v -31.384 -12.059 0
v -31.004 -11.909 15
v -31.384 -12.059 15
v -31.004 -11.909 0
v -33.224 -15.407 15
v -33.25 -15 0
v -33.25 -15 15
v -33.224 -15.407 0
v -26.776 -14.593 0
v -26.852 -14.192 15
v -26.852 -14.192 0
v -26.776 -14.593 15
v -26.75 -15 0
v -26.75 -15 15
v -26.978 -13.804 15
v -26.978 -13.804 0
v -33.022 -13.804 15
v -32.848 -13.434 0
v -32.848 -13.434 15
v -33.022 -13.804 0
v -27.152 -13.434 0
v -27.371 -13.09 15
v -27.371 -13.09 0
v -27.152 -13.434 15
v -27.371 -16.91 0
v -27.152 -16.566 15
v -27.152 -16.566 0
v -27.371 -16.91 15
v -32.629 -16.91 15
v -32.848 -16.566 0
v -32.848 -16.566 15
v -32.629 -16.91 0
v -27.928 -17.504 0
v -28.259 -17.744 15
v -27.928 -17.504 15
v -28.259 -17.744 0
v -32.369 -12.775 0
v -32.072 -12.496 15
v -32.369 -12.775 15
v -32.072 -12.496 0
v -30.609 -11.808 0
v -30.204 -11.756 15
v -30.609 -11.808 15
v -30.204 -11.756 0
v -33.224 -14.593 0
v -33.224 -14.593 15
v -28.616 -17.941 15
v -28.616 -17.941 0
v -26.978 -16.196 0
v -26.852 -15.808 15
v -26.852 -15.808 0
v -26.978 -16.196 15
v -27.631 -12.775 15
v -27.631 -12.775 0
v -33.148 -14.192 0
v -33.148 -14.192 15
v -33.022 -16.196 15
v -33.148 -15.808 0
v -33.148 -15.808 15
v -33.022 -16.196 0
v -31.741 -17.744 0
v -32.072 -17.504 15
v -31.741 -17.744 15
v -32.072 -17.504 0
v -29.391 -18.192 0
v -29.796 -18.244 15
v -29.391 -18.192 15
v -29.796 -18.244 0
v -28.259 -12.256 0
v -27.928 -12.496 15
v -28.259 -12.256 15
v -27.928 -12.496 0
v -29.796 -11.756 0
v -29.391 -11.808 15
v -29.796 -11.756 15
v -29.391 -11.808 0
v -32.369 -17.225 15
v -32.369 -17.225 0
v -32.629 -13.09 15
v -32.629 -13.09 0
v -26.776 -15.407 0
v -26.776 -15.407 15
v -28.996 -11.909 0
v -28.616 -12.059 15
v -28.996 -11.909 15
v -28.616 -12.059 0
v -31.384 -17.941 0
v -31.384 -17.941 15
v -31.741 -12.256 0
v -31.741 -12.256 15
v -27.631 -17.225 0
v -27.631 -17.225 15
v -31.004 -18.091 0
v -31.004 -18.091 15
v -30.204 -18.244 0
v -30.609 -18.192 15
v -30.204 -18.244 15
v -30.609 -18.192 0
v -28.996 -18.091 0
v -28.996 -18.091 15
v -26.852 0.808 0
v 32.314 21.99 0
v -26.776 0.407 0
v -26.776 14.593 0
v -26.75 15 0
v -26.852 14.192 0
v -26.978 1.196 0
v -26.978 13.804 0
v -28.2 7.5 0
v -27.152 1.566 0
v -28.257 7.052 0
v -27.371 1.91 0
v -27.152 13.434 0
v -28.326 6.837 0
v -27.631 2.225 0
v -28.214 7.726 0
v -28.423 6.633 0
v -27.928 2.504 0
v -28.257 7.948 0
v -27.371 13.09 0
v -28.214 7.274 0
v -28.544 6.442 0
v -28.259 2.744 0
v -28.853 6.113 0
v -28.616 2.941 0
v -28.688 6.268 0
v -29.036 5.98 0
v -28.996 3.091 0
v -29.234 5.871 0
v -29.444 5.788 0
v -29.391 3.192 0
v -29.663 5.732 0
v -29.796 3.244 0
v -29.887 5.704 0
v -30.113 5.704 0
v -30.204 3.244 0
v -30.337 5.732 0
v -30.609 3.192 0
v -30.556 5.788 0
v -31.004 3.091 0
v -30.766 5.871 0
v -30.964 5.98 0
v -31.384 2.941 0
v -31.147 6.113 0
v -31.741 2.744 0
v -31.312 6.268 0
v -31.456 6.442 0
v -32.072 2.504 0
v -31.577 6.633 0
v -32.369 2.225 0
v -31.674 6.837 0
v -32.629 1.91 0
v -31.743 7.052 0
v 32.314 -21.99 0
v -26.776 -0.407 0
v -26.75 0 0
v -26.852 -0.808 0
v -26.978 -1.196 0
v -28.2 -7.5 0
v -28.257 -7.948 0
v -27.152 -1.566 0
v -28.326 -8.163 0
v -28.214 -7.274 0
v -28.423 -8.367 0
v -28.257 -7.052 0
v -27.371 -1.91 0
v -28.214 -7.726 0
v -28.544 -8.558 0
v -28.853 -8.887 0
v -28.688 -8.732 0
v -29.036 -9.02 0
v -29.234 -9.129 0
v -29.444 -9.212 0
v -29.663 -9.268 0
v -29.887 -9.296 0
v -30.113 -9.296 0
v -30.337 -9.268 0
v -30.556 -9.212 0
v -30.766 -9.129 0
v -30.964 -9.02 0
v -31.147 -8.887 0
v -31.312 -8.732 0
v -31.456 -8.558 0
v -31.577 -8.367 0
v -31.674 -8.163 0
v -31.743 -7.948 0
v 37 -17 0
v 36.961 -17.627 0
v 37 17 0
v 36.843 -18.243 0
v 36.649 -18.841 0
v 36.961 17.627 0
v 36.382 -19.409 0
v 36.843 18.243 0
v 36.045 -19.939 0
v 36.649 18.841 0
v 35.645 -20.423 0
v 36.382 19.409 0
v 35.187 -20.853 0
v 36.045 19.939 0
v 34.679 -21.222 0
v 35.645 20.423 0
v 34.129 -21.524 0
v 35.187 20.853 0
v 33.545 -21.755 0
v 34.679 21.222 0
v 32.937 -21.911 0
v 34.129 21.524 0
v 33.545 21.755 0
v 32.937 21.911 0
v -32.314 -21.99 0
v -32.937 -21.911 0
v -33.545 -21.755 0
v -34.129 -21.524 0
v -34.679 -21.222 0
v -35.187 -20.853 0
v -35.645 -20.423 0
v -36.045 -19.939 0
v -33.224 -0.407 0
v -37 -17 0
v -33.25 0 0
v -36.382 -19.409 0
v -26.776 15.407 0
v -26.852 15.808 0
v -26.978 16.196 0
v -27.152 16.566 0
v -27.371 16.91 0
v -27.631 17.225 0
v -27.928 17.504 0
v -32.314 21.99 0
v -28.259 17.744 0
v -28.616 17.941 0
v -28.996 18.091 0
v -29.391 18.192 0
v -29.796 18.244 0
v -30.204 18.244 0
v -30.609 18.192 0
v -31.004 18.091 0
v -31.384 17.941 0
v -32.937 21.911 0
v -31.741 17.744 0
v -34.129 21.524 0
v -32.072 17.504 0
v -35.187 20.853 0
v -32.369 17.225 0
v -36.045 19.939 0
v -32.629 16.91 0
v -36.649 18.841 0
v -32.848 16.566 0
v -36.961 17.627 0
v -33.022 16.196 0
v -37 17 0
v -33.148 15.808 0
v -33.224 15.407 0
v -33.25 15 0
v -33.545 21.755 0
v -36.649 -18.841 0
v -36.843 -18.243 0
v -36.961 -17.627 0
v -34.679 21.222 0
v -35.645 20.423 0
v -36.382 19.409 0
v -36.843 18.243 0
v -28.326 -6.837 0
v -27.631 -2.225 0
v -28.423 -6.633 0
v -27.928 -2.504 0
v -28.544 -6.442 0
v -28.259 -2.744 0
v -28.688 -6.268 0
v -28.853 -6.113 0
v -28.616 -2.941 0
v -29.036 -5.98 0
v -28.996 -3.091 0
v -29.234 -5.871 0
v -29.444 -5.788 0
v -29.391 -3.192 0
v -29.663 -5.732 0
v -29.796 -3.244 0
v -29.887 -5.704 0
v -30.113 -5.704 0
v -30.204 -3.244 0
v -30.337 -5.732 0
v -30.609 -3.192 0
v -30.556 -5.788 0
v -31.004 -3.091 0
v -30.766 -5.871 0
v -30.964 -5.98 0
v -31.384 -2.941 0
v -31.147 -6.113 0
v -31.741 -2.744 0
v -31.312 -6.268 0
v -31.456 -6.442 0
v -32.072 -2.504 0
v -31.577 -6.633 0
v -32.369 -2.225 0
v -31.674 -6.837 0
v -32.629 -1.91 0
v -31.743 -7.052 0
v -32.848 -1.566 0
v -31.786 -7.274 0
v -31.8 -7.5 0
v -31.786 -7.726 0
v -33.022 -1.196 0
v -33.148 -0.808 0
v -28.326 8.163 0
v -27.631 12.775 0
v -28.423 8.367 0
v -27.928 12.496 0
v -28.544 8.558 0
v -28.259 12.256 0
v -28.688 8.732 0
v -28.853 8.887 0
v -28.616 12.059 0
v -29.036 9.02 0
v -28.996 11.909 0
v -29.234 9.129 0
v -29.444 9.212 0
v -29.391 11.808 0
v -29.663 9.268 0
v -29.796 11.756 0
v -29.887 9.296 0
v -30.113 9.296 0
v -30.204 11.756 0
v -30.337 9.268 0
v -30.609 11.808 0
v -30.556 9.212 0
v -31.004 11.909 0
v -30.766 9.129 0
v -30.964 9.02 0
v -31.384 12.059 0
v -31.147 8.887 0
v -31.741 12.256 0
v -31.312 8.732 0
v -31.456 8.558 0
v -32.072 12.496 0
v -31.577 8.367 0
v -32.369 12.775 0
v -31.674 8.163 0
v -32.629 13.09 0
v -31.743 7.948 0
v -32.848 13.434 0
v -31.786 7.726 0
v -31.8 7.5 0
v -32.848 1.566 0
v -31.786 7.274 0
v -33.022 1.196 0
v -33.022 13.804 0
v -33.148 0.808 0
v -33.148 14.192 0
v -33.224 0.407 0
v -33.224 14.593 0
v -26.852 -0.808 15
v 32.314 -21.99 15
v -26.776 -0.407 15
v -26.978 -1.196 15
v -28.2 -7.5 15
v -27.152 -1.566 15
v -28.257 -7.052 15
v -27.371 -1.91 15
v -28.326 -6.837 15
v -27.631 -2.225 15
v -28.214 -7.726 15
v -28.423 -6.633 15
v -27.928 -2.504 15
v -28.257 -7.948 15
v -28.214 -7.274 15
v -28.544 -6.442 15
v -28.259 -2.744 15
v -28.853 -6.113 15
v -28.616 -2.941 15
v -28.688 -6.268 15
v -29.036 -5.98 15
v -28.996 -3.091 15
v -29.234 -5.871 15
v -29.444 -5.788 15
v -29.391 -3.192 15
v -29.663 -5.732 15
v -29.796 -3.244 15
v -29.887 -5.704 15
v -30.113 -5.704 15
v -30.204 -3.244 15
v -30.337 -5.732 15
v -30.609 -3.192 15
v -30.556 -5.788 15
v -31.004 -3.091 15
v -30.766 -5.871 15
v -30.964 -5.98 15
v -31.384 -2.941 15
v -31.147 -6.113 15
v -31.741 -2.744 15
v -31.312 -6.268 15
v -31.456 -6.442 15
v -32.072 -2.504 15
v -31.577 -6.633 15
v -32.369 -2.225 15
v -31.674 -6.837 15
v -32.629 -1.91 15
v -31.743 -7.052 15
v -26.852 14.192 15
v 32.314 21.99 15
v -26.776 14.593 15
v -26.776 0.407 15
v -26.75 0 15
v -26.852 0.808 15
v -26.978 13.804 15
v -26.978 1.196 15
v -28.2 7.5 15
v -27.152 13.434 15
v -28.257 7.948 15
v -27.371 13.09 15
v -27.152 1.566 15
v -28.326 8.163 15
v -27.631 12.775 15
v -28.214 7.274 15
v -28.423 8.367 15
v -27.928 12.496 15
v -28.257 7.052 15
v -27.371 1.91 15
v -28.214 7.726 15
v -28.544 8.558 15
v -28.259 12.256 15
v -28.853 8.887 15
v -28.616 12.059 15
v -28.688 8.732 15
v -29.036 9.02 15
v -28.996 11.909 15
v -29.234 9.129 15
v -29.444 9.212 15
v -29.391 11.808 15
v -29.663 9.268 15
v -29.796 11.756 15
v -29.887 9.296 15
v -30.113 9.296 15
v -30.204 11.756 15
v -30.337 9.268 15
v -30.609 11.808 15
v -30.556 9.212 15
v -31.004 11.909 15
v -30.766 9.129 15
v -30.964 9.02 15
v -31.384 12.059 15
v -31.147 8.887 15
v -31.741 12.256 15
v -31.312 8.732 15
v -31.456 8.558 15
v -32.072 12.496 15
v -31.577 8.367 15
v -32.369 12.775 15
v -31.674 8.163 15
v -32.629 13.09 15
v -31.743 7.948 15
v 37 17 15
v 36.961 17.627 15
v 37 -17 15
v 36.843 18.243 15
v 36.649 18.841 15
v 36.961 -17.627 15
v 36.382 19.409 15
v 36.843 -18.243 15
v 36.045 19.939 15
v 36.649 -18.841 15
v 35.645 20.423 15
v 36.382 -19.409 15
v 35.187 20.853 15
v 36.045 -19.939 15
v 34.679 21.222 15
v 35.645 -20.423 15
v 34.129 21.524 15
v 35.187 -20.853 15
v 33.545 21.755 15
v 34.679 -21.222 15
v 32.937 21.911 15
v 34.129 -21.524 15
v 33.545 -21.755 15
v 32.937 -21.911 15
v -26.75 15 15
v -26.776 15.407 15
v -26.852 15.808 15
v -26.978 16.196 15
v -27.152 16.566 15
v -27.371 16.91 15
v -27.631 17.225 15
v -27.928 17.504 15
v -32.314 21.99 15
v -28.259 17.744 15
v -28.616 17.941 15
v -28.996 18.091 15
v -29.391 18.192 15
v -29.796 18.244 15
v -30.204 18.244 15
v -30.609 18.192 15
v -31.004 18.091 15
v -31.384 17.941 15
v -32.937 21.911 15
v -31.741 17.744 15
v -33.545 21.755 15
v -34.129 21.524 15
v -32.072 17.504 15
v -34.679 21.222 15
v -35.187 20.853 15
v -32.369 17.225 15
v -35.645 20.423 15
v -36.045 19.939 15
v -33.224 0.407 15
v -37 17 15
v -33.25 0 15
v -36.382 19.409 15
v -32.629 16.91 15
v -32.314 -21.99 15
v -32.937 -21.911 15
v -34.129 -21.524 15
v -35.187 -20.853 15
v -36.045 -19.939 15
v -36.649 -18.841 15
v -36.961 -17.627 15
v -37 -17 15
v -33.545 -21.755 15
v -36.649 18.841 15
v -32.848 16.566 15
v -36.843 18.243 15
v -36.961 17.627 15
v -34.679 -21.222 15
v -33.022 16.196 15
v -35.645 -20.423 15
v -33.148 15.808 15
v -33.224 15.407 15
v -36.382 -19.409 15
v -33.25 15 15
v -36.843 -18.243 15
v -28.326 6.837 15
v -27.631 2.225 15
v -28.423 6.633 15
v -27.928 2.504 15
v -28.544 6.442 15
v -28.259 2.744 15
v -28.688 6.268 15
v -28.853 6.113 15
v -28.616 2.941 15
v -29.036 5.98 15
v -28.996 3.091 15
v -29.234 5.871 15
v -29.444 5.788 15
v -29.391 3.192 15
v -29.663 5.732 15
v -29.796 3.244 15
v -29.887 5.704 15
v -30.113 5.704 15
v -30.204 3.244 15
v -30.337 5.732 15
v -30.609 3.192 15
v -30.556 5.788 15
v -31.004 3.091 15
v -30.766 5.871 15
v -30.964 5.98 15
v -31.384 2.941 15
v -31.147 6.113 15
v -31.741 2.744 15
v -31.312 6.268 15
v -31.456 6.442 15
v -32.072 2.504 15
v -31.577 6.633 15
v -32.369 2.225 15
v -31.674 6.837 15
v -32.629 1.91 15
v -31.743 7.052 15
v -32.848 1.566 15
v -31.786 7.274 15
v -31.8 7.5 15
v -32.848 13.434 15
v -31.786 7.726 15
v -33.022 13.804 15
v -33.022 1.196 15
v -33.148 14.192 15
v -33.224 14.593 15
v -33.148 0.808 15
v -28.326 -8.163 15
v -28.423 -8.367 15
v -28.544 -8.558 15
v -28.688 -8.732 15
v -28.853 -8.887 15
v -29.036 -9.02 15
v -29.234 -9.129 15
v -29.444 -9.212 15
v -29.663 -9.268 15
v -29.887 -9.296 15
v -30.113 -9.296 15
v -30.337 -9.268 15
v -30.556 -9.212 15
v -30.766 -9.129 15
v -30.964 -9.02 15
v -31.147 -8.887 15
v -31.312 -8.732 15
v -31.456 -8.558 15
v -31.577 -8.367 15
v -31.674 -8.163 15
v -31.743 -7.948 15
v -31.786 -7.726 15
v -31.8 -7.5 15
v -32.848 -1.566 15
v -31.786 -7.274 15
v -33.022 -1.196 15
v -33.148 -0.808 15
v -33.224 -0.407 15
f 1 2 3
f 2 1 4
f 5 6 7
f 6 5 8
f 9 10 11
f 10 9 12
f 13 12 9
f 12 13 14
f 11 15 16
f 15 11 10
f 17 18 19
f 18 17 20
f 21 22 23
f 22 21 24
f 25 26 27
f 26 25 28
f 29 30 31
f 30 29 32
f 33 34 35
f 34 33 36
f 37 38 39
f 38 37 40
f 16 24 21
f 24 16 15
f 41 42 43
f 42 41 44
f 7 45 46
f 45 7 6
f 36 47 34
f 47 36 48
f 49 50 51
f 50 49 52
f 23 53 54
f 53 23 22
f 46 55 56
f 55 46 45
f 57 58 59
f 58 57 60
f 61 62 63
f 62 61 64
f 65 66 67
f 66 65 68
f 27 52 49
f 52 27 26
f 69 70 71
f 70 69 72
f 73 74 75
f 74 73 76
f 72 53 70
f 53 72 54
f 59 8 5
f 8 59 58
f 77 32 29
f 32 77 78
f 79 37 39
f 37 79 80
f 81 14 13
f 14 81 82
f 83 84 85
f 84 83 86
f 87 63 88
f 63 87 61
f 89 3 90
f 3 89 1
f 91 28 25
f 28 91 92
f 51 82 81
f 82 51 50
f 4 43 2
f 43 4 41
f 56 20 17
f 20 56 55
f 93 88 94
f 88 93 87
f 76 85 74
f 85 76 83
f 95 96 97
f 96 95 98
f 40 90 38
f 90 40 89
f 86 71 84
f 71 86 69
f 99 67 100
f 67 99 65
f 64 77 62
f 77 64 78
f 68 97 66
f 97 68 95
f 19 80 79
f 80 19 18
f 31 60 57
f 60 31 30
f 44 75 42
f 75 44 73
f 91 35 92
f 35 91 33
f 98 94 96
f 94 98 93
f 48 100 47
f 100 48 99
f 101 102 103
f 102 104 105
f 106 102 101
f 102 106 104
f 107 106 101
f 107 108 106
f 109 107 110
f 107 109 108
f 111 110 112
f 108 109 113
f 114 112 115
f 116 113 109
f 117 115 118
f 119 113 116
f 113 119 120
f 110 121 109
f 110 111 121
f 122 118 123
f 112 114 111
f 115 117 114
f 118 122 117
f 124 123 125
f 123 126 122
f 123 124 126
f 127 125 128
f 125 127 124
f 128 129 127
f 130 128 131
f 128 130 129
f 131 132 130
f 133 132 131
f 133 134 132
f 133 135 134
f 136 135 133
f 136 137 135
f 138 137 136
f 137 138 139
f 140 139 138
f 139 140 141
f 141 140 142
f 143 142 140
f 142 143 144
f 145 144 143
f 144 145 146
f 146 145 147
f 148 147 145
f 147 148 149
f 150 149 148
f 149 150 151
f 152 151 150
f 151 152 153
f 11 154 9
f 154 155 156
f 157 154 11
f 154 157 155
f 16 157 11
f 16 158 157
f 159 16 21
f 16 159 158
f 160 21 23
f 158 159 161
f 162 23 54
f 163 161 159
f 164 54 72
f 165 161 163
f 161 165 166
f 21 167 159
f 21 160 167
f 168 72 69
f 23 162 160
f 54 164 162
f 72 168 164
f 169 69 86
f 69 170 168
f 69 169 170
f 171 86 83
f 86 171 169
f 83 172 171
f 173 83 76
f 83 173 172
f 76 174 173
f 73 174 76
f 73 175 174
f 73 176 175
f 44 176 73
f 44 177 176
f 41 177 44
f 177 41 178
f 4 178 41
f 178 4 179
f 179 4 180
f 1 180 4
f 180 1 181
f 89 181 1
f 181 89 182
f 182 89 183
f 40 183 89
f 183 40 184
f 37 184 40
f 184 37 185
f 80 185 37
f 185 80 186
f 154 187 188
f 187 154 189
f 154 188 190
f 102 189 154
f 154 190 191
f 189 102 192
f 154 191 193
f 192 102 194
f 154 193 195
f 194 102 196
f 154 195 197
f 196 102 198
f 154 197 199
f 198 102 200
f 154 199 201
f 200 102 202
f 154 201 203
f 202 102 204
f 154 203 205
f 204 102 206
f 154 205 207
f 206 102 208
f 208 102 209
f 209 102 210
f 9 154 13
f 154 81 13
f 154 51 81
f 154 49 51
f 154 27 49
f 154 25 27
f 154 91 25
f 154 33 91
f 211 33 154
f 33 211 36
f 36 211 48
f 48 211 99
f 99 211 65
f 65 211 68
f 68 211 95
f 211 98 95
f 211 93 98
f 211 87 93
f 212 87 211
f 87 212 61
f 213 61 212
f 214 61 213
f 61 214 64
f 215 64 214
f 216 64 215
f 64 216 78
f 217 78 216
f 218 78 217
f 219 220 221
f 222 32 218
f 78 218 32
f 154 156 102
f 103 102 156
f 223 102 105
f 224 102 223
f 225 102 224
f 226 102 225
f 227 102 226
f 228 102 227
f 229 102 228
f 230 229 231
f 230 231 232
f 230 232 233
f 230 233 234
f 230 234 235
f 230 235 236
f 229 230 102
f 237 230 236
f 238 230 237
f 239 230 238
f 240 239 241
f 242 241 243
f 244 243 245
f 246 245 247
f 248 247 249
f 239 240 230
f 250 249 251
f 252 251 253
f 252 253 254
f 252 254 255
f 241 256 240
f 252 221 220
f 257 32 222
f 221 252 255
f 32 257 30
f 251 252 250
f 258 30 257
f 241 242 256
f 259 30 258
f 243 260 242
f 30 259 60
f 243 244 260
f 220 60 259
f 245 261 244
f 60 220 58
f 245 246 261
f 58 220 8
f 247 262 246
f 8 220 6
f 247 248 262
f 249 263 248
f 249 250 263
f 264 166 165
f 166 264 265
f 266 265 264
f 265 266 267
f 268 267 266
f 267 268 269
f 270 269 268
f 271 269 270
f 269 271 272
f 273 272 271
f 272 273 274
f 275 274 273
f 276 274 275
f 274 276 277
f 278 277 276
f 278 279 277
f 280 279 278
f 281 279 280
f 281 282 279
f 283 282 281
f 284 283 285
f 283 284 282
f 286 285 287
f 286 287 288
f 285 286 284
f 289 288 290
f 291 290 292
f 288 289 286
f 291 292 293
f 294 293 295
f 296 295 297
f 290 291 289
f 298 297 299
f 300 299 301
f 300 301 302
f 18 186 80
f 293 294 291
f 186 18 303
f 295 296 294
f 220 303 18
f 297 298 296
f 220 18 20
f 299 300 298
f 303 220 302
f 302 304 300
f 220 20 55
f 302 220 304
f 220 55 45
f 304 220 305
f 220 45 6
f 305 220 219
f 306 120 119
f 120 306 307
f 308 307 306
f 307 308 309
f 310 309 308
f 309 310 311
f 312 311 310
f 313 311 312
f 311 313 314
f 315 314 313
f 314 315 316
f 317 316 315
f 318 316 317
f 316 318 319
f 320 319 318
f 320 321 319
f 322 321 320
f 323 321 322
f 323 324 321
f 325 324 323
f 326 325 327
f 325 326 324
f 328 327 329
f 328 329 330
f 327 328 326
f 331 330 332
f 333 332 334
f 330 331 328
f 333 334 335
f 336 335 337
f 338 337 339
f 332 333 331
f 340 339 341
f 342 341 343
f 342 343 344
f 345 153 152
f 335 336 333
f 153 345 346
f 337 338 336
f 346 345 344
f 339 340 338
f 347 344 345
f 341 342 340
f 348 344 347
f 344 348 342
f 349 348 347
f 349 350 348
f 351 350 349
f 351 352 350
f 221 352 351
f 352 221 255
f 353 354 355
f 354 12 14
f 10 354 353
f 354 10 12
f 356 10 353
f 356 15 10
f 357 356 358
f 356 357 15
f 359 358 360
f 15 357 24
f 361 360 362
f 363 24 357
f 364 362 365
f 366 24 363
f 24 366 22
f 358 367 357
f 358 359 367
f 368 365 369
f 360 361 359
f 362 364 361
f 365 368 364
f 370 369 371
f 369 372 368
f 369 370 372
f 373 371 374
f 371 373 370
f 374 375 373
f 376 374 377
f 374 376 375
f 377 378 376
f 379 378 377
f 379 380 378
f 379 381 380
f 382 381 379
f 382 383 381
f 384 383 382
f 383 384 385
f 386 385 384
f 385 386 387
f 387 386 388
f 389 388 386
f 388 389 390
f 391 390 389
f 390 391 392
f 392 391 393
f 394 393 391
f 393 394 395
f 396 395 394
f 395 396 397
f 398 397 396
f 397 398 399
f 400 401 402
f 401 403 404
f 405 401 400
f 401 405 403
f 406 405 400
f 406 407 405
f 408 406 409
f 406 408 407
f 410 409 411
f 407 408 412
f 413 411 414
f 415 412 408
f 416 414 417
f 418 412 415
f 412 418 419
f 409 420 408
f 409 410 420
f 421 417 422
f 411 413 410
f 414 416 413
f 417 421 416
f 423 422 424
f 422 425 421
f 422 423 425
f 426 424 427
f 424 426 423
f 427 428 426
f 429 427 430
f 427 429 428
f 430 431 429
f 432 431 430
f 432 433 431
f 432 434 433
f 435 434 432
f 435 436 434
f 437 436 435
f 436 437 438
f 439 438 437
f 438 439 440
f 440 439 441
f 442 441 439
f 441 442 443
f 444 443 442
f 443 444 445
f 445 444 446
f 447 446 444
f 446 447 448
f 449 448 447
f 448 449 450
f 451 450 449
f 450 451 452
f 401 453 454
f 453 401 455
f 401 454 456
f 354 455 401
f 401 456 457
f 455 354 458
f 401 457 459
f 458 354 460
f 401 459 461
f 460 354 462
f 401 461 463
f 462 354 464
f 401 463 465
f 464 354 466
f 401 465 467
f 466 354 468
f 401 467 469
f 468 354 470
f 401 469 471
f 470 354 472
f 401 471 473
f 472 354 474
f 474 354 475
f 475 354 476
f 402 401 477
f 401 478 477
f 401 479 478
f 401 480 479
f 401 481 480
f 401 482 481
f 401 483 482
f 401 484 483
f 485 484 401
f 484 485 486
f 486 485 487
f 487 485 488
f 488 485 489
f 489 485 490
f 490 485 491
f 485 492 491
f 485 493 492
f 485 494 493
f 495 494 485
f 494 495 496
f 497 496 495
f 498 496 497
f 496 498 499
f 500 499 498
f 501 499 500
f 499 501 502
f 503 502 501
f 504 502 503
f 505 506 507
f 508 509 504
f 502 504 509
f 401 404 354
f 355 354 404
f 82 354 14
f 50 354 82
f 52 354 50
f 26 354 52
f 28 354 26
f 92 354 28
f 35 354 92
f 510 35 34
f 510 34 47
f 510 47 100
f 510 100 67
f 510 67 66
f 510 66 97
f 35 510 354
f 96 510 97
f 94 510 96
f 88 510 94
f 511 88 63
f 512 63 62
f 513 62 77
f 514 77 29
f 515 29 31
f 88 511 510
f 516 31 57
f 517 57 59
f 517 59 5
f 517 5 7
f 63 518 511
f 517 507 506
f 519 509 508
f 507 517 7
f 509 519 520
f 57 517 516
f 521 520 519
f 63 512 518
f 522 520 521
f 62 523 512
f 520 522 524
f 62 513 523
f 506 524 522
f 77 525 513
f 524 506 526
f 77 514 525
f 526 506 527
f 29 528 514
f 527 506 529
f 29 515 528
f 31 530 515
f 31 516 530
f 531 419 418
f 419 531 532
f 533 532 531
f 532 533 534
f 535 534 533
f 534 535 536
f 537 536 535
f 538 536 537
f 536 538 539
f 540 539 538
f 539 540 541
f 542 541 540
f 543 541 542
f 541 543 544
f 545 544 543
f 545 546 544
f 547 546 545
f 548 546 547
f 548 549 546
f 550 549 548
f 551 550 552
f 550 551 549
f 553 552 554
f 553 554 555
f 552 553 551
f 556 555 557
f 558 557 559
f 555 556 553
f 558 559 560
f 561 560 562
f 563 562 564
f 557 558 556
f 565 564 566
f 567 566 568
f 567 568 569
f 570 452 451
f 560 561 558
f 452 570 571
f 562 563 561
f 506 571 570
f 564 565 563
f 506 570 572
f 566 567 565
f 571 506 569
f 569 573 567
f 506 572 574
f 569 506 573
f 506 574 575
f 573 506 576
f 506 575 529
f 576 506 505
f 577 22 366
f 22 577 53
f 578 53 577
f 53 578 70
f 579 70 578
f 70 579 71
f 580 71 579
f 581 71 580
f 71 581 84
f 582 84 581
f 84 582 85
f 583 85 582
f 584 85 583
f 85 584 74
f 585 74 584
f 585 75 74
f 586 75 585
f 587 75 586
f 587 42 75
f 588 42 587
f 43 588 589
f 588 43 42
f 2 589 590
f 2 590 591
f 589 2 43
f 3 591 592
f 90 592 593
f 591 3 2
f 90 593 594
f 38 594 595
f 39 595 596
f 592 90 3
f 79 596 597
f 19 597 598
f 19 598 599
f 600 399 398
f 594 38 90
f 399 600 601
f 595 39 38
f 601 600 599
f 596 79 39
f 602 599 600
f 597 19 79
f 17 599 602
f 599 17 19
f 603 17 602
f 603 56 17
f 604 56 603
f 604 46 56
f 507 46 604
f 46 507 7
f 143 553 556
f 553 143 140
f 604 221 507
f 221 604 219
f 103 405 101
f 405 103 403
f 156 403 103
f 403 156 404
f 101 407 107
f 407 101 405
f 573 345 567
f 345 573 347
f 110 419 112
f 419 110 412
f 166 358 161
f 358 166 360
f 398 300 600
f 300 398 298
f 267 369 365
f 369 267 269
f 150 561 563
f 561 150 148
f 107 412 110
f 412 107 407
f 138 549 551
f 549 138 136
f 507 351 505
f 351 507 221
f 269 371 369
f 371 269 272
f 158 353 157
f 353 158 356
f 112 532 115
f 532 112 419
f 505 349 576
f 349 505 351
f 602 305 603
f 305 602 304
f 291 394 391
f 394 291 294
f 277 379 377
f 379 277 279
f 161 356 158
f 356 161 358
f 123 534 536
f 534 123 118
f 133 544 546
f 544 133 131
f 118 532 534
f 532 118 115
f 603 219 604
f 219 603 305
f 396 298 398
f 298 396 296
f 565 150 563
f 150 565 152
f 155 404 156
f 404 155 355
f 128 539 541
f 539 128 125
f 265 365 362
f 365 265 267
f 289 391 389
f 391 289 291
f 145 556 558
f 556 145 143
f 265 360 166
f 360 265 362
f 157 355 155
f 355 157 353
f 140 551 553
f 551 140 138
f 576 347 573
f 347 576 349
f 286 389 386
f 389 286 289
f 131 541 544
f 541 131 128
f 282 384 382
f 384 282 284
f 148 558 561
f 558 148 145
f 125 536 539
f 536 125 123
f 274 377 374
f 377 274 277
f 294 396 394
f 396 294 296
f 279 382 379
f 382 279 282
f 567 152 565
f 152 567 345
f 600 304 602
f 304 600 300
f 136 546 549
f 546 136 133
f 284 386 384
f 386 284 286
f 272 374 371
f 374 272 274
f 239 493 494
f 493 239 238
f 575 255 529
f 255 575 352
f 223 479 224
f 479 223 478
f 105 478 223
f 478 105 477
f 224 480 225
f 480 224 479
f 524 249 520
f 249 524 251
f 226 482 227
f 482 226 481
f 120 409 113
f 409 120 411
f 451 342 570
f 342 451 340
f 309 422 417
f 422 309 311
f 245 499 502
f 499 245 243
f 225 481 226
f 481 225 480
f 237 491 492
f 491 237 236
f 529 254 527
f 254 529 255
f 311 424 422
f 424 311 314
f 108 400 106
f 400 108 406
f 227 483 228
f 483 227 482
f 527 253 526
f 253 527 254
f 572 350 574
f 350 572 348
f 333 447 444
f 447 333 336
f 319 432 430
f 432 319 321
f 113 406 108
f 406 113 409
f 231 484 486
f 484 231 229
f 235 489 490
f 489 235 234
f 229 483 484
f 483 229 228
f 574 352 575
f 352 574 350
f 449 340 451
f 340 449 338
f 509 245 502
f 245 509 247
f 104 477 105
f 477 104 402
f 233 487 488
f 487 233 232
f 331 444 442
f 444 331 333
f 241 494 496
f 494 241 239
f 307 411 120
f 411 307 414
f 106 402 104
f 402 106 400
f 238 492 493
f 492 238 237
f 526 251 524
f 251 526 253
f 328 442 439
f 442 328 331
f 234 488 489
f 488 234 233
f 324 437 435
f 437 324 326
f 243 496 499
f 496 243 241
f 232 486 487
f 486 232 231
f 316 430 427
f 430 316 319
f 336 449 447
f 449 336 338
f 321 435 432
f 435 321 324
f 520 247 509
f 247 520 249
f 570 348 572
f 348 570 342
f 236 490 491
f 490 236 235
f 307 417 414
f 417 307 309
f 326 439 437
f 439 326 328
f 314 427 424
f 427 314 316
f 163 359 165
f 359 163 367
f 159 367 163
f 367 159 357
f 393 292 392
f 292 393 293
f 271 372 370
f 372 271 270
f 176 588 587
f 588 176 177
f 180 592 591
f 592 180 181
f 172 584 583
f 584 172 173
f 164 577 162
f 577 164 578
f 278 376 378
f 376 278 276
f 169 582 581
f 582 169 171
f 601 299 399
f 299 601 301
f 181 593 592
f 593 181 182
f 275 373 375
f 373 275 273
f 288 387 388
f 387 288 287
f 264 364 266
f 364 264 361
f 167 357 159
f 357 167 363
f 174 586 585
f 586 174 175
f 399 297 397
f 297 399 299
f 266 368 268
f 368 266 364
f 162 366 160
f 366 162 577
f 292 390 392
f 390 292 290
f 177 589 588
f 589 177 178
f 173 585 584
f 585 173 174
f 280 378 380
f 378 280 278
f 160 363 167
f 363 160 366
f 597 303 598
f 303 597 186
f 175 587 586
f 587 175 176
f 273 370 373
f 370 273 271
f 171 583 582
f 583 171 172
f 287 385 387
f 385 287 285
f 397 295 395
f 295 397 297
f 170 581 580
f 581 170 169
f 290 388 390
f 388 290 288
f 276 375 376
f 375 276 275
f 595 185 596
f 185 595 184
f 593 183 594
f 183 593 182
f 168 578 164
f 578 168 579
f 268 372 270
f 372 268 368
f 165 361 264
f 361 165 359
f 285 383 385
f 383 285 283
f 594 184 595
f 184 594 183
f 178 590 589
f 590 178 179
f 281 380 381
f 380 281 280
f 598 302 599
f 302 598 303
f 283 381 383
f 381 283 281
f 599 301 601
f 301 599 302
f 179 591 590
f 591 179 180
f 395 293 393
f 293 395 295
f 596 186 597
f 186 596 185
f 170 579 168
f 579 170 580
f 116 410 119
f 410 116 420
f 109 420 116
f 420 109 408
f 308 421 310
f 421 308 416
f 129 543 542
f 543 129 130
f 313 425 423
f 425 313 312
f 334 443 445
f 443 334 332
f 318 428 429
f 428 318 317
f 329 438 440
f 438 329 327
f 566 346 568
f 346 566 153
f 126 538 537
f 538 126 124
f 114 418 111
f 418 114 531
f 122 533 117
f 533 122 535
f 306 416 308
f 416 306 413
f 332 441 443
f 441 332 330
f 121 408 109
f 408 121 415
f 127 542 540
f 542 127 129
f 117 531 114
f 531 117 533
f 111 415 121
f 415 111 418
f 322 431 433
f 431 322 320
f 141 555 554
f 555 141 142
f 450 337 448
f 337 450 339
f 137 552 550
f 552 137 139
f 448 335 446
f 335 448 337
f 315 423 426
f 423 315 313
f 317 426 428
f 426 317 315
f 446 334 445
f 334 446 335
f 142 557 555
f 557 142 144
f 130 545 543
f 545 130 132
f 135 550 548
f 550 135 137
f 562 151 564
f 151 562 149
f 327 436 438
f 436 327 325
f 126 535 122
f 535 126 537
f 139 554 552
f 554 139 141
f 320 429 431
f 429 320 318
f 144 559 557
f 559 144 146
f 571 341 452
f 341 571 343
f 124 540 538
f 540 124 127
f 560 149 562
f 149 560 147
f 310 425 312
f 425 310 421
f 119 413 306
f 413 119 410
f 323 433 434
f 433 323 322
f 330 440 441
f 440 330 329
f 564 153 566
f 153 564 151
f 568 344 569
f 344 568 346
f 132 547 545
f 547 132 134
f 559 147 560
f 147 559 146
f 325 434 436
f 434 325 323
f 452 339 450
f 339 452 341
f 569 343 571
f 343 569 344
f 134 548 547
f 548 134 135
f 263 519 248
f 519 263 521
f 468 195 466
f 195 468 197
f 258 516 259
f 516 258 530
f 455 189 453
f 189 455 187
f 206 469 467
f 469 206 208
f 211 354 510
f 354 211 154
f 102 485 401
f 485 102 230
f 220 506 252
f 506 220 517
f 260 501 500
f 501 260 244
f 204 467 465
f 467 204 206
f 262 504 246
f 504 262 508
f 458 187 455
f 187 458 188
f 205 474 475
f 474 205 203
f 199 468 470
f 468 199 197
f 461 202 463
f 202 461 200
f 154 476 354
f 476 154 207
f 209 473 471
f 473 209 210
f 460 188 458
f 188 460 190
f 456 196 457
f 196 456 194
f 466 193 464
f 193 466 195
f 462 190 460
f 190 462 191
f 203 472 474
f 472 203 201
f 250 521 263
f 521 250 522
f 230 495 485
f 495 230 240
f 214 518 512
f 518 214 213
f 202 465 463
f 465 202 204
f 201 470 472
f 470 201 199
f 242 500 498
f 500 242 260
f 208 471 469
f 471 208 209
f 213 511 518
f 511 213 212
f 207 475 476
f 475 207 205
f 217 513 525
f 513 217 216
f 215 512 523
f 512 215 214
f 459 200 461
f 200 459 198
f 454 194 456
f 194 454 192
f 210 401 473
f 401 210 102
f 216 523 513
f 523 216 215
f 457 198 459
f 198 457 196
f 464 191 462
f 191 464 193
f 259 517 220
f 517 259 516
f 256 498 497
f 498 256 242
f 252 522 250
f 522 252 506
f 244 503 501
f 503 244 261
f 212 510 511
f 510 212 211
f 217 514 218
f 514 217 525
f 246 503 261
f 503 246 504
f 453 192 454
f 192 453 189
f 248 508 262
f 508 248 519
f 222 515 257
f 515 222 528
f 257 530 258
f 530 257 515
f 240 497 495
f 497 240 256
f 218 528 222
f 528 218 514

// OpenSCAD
$fn = 50;


difference() {
	union() {
		hull() {
			translate(v = [-32.0000000000, 17.0000000000, 0]) {
				cylinder(h = 15, r = 5);
			}
			translate(v = [32.0000000000, 17.0000000000, 0]) {
				cylinder(h = 15, r = 5);
			}
			translate(v = [-32.0000000000, -17.0000000000, 0]) {
				cylinder(h = 15, r = 5);
			}
			translate(v = [32.0000000000, -17.0000000000, 0]) {
				cylinder(h = 15, r = 5);
			}
		}
	}
	union() {
		translate(v = [-30.0000000000, -15.0000000000, 0]) {
			cylinder(h = 15, r = 3.2500000000);
		}
		translate(v = [-30.0000000000, 0.0000000000, 0]) {
			cylinder(h = 15, r = 3.2500000000);
		}
		translate(v = [-30.0000000000, 15.0000000000, 0]) {
			cylinder(h = 15, r = 3.2500000000);
		}
		translate(v = [-30.0000000000, -15.0000000000, 0]) {
			cylinder(h = 15, r = 1.8000000000);
		}
		translate(v = [-30.0000000000, -7.5000000000, 0]) {
			cylinder(h = 15, r = 1.8000000000);
		}
		translate(v = [-30.0000000000, 0.0000000000, 0]) {
			cylinder(h = 15, r = 1.8000000000);
		}
		translate(v = [-30.0000000000, 7.5000000000, 0]) {
			cylinder(h = 15, r = 1.8000000000);
		}
		translate(v = [-30.0000000000, 15.0000000000, 0]) {
			cylinder(h = 15, r = 1.8000000000);
		}
		translate(v = [-30.0000000000, -15.0000000000, 0]) {
			cylinder(h = 15, r = 1.8000000000);
		}
		translate(v = [-30.0000000000, -7.5000000000, 0]) {
			cylinder(h = 15, r = 1.8000000000);
		}
		translate(v = [-30.0000000000, 0.0000000000, 0]) {
			cylinder(h = 15, r = 1.8000000000);
		}
		translate(v = [-30.0000000000, 7.5000000000, 0]) {
			cylinder(h = 15, r = 1.8000000000);
		}
		translate(v = [-30.0000000000, 15.0000000000, 0]) {
			cylinder(h = 15, r = 1.8000000000);
		}
		translate(v = [-30.0000000000, -15.0000000000, 0]) {
			cylinder(h = 15, r = 1.8000000000);
		}
		translate(v = [-30.0000000000, -7.5000000000, 0]) {
			cylinder(h = 15, r = 1.8000000000);
		}
		translate(v = [-30.0000000000, 0.0000000000, 0]) {
			cylinder(h = 15, r = 1.8000000000);
		}
		translate(v = [-30.0000000000, 7.5000000000, 0]) {
			cylinder(h = 15, r = 1.8000000000);
		}
		translate(v = [-30.0000000000, 15.0000000000, 0]) {
			cylinder(h = 15, r = 1.8000000000);
		}
	}
}
